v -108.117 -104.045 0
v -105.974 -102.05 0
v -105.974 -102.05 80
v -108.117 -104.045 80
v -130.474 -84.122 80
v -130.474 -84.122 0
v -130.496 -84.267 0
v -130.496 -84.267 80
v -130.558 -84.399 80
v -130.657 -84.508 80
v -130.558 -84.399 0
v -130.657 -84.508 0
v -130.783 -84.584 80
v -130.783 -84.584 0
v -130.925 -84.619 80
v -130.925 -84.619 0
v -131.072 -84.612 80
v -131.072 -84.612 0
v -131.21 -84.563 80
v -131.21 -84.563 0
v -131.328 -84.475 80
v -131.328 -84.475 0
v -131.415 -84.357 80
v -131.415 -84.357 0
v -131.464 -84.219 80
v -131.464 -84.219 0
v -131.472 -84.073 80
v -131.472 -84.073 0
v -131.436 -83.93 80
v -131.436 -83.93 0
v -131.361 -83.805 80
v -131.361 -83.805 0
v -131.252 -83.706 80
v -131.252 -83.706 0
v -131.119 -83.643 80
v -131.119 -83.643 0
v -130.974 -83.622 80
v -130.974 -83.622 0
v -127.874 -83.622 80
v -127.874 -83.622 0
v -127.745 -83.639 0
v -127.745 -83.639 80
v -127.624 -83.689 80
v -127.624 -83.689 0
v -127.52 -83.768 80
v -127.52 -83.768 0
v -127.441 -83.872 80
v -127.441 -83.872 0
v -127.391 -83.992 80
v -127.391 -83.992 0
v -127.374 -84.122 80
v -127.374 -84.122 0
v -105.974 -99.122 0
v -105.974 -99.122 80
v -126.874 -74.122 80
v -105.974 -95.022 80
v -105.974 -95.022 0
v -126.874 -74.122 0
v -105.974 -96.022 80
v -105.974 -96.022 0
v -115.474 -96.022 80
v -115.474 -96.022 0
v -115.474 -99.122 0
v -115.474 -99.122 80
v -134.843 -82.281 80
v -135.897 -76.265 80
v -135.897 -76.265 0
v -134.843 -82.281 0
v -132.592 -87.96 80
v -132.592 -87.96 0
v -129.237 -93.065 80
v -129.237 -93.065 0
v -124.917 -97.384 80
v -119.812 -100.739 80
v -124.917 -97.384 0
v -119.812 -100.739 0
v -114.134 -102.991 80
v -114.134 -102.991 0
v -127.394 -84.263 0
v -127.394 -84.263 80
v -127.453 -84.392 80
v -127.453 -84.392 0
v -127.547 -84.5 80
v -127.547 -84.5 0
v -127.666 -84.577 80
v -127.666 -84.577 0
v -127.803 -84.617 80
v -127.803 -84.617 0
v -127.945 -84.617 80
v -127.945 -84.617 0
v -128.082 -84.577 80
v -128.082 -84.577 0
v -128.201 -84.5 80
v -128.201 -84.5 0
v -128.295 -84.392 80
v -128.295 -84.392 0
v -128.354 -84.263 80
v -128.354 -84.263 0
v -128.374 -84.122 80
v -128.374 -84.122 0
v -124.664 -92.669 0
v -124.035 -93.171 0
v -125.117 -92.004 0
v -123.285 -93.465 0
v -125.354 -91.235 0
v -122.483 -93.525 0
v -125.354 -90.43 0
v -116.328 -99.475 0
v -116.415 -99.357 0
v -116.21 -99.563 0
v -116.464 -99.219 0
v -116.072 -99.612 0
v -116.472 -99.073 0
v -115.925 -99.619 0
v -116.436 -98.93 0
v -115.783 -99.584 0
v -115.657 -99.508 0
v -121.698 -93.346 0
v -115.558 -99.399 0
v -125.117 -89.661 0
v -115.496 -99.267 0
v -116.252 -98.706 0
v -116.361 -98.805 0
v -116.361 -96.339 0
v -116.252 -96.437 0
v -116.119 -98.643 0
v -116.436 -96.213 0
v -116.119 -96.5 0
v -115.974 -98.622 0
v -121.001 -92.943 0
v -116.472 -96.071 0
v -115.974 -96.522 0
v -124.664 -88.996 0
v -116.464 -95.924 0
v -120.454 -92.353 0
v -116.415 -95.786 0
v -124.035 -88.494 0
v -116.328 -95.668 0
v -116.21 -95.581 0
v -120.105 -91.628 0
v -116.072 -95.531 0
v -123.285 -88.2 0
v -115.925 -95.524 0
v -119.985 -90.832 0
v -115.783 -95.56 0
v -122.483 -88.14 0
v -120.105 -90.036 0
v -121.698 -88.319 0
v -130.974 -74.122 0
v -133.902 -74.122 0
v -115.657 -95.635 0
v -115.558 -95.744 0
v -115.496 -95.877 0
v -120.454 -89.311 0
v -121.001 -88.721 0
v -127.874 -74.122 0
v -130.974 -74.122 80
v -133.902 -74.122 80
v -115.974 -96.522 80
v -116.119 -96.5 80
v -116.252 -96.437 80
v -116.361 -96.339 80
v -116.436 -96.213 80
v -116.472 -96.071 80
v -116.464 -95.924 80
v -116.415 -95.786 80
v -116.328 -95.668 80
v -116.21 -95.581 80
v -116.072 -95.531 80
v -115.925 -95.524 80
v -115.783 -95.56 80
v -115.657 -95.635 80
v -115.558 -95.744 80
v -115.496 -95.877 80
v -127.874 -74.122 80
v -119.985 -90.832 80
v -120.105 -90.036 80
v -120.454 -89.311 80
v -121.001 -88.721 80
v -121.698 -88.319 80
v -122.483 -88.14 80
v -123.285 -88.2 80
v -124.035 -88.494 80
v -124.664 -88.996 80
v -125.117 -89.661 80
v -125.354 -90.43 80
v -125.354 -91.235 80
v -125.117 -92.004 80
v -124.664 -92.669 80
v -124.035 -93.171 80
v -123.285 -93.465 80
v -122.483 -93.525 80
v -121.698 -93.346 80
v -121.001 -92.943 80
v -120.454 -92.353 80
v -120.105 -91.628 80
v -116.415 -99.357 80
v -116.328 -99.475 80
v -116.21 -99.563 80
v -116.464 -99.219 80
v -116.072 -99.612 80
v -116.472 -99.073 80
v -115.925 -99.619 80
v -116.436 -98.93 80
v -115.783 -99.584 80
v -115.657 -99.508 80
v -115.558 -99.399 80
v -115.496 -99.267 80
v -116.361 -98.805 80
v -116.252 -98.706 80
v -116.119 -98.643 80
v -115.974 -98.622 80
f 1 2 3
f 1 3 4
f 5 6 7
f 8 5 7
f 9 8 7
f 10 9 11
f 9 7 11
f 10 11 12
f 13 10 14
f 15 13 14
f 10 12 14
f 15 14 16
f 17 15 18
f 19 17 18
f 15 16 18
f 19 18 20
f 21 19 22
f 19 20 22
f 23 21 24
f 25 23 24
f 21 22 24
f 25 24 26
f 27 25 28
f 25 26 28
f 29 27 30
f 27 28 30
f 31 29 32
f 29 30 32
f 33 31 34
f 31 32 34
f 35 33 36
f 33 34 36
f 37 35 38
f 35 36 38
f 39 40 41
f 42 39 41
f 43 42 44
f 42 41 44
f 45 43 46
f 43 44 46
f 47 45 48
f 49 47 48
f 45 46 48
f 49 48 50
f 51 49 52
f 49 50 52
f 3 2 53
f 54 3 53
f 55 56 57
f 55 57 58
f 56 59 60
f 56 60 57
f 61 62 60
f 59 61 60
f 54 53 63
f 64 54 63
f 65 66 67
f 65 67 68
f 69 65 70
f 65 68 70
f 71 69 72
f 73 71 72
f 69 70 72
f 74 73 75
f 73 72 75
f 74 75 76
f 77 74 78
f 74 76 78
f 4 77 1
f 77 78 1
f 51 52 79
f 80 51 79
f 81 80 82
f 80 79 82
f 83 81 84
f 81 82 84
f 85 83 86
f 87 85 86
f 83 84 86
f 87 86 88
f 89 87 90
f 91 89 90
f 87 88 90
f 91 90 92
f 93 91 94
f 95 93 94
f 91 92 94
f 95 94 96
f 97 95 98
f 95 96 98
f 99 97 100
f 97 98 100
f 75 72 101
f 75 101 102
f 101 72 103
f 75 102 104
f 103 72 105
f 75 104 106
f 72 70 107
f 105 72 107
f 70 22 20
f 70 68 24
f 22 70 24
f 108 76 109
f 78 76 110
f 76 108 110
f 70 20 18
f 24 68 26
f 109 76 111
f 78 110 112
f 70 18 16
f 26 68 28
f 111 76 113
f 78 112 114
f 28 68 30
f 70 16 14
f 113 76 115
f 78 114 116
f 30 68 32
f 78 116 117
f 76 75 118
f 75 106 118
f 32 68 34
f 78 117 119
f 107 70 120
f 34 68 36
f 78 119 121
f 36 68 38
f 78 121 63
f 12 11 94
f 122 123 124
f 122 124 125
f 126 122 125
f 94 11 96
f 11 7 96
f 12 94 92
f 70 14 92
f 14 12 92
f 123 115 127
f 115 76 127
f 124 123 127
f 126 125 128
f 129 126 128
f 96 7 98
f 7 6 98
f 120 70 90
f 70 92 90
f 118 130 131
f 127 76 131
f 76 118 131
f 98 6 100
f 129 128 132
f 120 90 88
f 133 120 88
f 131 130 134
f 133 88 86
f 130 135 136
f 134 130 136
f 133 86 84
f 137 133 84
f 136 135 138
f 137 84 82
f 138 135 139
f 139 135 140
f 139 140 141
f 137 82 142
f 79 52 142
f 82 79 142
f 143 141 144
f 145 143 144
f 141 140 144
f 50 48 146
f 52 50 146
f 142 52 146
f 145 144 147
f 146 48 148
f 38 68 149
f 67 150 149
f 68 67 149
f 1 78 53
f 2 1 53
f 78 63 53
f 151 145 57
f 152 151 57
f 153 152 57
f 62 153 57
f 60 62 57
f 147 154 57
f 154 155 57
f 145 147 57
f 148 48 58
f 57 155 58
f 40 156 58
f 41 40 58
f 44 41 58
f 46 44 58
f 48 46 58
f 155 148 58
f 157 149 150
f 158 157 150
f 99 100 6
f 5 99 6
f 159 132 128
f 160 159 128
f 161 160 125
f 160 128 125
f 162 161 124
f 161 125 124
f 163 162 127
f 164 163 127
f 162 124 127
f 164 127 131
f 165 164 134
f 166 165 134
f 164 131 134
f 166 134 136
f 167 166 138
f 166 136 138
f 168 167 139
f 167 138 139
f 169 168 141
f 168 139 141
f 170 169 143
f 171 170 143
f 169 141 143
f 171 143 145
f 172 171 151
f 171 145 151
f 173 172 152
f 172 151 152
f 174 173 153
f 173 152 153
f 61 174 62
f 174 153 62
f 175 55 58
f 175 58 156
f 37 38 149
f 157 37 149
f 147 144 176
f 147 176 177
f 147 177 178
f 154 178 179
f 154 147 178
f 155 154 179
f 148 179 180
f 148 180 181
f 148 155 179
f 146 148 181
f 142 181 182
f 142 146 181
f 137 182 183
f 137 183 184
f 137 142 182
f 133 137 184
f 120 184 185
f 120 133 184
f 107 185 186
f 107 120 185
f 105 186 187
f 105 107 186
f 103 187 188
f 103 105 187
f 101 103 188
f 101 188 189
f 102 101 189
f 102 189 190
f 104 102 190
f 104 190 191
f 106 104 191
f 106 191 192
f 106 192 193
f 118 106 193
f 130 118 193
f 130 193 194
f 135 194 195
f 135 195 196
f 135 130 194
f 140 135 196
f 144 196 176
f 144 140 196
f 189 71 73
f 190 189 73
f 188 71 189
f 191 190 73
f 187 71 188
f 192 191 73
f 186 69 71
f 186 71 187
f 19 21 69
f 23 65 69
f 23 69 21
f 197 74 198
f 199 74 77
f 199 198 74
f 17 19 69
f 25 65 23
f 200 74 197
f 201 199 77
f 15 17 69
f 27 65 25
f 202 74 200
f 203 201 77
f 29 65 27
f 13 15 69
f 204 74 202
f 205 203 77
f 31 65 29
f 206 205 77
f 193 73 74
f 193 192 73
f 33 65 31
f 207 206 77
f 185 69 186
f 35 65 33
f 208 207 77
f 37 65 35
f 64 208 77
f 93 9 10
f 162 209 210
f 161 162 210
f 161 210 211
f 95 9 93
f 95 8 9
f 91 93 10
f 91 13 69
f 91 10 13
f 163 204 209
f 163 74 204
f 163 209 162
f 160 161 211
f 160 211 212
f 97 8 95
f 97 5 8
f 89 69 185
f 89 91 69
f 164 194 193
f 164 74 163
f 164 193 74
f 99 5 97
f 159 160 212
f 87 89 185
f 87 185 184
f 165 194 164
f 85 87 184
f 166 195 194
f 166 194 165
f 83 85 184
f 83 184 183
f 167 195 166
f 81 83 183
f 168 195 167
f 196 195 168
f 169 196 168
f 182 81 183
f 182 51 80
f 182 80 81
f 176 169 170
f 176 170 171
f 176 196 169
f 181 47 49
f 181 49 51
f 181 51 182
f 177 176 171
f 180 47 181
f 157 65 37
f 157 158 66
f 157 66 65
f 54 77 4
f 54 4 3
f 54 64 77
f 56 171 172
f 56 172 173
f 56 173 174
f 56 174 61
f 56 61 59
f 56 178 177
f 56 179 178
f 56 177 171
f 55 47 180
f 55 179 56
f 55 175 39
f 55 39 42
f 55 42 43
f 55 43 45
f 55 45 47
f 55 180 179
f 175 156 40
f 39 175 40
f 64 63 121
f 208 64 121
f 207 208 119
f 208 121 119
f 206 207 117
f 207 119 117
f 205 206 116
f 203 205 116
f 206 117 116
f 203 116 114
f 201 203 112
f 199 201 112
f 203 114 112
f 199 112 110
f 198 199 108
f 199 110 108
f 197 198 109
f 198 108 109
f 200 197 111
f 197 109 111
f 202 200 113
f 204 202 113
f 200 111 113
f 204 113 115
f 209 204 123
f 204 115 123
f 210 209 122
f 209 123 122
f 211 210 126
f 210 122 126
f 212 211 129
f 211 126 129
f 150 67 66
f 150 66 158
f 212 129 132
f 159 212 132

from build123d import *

# Parameters (mm, degrees)
F0_R        = 2.7
F1_DEPTH    = 80
F2_T1_DEPTH = 91.0076112648


# Not quite as in the source:
# - a fillet or chamfer that OpenCascade refuses, or shapes differently, is made with other operations: its cross-section is extruded or revolved along the edge and cut away or added


with BuildPart() as f1:
    # F0 (on Top) → F1 (new body)
    with BuildSketch(Plane.XY):
        with BuildLine():
            Line((-130.9739977717, -74.1217002273), (-135.9739977717, -74.1217002273))
            ThreePointArc((-135.9739977717, -74.1217002273), (-127.1872012073, -95.3349036629), (-105.9739977717, -104.1217002273))
            Line((-105.9739977717, -104.1217002273), (-105.9739977717, -99.1217002273))
            Line((-105.9739977717, -99.1217002273), (-115.4739977717, -99.1217002273))
            ThreePointArc((-115.4739977717, -99.1217002273), (-116.3275511623, -99.4752536179), (-115.9739977717, -98.6217002273))
            Line((-115.9739977717, -98.6217002273), (-115.9739977717, -96.5217002273))
            ThreePointArc((-115.9739977717, -96.5217002273), (-116.3275511623, -95.6681468367), (-115.4739977717, -96.0217002273))
            Line((-115.4739977717, -96.0217002273), (-105.9739977717, -96.0217002273))
            Line((-105.9739977717, -96.0217002273), (-105.9739977717, -95.0217002273))
            Line((-105.9739977717, -95.0217002273), (-126.8739977717, -74.1217002273))
            Line((-126.8739977717, -74.1217002273), (-127.8739977717, -74.1217002273))
            Line((-127.8739977717, -74.1217002273), (-127.8739977717, -83.6217002273))
            ThreePointArc((-127.8739977717, -83.6217002273), (-127.5204443811, -83.7681468367), (-127.3739977717, -84.1217002273))
            ThreePointArc((-127.3739977717, -84.1217002273), (-127.8739977717, -84.6217002273), (-128.3739977717, -84.1217002273))
            Line((-128.3739977717, -84.1217002273), (-130.4739977717, -84.1217002273))
            ThreePointArc((-130.4739977717, -84.1217002273), (-131.3275511623, -84.4752536179), (-130.9739977717, -83.6217002273))
            Line((-130.9739977717, -83.6217002273), (-130.9739977717, -74.1217002273))
        make_face()
        with Locations((-122.684560746, -90.8322632015)):
            Circle(F0_R, mode=Mode.SUBTRACT)
    extrude(amount=F1_DEPTH)

    # F2: chamfer of 2 on 2 edges, made by hand

    # F2_s2 → F2_t1 (cut)
    with BuildSketch(Plane.XY.offset(-5.5038056324)):
        with BuildLine():
            Line((-105.9739977717, -102.0501803148), (-108.1168549146, -104.0450717496))
            ThreePointArc((-108.1168549146, -104.0450717496), (-107.074368306, -104.1015131801), (-105.9739977717, -104.1217002273))
            Line((-105.9739977717, -104.1217002273), (-105.9739977717, -102.0501803148))
        make_face()
        with BuildLine():
            Line((-135.8973692941, -76.2645573701), (-133.9024778593, -74.1217002273))
            Line((-133.9024778593, -74.1217002273), (-135.9739977717, -74.1217002273))
            ThreePointArc((-135.9739977717, -74.1217002273), (-135.9538107246, -75.2220707615), (-135.8973692941, -76.2645573701))
        make_face()
    extrude(amount=F2_T1_DEPTH, mode=Mode.SUBTRACT)


solid = f1.part
